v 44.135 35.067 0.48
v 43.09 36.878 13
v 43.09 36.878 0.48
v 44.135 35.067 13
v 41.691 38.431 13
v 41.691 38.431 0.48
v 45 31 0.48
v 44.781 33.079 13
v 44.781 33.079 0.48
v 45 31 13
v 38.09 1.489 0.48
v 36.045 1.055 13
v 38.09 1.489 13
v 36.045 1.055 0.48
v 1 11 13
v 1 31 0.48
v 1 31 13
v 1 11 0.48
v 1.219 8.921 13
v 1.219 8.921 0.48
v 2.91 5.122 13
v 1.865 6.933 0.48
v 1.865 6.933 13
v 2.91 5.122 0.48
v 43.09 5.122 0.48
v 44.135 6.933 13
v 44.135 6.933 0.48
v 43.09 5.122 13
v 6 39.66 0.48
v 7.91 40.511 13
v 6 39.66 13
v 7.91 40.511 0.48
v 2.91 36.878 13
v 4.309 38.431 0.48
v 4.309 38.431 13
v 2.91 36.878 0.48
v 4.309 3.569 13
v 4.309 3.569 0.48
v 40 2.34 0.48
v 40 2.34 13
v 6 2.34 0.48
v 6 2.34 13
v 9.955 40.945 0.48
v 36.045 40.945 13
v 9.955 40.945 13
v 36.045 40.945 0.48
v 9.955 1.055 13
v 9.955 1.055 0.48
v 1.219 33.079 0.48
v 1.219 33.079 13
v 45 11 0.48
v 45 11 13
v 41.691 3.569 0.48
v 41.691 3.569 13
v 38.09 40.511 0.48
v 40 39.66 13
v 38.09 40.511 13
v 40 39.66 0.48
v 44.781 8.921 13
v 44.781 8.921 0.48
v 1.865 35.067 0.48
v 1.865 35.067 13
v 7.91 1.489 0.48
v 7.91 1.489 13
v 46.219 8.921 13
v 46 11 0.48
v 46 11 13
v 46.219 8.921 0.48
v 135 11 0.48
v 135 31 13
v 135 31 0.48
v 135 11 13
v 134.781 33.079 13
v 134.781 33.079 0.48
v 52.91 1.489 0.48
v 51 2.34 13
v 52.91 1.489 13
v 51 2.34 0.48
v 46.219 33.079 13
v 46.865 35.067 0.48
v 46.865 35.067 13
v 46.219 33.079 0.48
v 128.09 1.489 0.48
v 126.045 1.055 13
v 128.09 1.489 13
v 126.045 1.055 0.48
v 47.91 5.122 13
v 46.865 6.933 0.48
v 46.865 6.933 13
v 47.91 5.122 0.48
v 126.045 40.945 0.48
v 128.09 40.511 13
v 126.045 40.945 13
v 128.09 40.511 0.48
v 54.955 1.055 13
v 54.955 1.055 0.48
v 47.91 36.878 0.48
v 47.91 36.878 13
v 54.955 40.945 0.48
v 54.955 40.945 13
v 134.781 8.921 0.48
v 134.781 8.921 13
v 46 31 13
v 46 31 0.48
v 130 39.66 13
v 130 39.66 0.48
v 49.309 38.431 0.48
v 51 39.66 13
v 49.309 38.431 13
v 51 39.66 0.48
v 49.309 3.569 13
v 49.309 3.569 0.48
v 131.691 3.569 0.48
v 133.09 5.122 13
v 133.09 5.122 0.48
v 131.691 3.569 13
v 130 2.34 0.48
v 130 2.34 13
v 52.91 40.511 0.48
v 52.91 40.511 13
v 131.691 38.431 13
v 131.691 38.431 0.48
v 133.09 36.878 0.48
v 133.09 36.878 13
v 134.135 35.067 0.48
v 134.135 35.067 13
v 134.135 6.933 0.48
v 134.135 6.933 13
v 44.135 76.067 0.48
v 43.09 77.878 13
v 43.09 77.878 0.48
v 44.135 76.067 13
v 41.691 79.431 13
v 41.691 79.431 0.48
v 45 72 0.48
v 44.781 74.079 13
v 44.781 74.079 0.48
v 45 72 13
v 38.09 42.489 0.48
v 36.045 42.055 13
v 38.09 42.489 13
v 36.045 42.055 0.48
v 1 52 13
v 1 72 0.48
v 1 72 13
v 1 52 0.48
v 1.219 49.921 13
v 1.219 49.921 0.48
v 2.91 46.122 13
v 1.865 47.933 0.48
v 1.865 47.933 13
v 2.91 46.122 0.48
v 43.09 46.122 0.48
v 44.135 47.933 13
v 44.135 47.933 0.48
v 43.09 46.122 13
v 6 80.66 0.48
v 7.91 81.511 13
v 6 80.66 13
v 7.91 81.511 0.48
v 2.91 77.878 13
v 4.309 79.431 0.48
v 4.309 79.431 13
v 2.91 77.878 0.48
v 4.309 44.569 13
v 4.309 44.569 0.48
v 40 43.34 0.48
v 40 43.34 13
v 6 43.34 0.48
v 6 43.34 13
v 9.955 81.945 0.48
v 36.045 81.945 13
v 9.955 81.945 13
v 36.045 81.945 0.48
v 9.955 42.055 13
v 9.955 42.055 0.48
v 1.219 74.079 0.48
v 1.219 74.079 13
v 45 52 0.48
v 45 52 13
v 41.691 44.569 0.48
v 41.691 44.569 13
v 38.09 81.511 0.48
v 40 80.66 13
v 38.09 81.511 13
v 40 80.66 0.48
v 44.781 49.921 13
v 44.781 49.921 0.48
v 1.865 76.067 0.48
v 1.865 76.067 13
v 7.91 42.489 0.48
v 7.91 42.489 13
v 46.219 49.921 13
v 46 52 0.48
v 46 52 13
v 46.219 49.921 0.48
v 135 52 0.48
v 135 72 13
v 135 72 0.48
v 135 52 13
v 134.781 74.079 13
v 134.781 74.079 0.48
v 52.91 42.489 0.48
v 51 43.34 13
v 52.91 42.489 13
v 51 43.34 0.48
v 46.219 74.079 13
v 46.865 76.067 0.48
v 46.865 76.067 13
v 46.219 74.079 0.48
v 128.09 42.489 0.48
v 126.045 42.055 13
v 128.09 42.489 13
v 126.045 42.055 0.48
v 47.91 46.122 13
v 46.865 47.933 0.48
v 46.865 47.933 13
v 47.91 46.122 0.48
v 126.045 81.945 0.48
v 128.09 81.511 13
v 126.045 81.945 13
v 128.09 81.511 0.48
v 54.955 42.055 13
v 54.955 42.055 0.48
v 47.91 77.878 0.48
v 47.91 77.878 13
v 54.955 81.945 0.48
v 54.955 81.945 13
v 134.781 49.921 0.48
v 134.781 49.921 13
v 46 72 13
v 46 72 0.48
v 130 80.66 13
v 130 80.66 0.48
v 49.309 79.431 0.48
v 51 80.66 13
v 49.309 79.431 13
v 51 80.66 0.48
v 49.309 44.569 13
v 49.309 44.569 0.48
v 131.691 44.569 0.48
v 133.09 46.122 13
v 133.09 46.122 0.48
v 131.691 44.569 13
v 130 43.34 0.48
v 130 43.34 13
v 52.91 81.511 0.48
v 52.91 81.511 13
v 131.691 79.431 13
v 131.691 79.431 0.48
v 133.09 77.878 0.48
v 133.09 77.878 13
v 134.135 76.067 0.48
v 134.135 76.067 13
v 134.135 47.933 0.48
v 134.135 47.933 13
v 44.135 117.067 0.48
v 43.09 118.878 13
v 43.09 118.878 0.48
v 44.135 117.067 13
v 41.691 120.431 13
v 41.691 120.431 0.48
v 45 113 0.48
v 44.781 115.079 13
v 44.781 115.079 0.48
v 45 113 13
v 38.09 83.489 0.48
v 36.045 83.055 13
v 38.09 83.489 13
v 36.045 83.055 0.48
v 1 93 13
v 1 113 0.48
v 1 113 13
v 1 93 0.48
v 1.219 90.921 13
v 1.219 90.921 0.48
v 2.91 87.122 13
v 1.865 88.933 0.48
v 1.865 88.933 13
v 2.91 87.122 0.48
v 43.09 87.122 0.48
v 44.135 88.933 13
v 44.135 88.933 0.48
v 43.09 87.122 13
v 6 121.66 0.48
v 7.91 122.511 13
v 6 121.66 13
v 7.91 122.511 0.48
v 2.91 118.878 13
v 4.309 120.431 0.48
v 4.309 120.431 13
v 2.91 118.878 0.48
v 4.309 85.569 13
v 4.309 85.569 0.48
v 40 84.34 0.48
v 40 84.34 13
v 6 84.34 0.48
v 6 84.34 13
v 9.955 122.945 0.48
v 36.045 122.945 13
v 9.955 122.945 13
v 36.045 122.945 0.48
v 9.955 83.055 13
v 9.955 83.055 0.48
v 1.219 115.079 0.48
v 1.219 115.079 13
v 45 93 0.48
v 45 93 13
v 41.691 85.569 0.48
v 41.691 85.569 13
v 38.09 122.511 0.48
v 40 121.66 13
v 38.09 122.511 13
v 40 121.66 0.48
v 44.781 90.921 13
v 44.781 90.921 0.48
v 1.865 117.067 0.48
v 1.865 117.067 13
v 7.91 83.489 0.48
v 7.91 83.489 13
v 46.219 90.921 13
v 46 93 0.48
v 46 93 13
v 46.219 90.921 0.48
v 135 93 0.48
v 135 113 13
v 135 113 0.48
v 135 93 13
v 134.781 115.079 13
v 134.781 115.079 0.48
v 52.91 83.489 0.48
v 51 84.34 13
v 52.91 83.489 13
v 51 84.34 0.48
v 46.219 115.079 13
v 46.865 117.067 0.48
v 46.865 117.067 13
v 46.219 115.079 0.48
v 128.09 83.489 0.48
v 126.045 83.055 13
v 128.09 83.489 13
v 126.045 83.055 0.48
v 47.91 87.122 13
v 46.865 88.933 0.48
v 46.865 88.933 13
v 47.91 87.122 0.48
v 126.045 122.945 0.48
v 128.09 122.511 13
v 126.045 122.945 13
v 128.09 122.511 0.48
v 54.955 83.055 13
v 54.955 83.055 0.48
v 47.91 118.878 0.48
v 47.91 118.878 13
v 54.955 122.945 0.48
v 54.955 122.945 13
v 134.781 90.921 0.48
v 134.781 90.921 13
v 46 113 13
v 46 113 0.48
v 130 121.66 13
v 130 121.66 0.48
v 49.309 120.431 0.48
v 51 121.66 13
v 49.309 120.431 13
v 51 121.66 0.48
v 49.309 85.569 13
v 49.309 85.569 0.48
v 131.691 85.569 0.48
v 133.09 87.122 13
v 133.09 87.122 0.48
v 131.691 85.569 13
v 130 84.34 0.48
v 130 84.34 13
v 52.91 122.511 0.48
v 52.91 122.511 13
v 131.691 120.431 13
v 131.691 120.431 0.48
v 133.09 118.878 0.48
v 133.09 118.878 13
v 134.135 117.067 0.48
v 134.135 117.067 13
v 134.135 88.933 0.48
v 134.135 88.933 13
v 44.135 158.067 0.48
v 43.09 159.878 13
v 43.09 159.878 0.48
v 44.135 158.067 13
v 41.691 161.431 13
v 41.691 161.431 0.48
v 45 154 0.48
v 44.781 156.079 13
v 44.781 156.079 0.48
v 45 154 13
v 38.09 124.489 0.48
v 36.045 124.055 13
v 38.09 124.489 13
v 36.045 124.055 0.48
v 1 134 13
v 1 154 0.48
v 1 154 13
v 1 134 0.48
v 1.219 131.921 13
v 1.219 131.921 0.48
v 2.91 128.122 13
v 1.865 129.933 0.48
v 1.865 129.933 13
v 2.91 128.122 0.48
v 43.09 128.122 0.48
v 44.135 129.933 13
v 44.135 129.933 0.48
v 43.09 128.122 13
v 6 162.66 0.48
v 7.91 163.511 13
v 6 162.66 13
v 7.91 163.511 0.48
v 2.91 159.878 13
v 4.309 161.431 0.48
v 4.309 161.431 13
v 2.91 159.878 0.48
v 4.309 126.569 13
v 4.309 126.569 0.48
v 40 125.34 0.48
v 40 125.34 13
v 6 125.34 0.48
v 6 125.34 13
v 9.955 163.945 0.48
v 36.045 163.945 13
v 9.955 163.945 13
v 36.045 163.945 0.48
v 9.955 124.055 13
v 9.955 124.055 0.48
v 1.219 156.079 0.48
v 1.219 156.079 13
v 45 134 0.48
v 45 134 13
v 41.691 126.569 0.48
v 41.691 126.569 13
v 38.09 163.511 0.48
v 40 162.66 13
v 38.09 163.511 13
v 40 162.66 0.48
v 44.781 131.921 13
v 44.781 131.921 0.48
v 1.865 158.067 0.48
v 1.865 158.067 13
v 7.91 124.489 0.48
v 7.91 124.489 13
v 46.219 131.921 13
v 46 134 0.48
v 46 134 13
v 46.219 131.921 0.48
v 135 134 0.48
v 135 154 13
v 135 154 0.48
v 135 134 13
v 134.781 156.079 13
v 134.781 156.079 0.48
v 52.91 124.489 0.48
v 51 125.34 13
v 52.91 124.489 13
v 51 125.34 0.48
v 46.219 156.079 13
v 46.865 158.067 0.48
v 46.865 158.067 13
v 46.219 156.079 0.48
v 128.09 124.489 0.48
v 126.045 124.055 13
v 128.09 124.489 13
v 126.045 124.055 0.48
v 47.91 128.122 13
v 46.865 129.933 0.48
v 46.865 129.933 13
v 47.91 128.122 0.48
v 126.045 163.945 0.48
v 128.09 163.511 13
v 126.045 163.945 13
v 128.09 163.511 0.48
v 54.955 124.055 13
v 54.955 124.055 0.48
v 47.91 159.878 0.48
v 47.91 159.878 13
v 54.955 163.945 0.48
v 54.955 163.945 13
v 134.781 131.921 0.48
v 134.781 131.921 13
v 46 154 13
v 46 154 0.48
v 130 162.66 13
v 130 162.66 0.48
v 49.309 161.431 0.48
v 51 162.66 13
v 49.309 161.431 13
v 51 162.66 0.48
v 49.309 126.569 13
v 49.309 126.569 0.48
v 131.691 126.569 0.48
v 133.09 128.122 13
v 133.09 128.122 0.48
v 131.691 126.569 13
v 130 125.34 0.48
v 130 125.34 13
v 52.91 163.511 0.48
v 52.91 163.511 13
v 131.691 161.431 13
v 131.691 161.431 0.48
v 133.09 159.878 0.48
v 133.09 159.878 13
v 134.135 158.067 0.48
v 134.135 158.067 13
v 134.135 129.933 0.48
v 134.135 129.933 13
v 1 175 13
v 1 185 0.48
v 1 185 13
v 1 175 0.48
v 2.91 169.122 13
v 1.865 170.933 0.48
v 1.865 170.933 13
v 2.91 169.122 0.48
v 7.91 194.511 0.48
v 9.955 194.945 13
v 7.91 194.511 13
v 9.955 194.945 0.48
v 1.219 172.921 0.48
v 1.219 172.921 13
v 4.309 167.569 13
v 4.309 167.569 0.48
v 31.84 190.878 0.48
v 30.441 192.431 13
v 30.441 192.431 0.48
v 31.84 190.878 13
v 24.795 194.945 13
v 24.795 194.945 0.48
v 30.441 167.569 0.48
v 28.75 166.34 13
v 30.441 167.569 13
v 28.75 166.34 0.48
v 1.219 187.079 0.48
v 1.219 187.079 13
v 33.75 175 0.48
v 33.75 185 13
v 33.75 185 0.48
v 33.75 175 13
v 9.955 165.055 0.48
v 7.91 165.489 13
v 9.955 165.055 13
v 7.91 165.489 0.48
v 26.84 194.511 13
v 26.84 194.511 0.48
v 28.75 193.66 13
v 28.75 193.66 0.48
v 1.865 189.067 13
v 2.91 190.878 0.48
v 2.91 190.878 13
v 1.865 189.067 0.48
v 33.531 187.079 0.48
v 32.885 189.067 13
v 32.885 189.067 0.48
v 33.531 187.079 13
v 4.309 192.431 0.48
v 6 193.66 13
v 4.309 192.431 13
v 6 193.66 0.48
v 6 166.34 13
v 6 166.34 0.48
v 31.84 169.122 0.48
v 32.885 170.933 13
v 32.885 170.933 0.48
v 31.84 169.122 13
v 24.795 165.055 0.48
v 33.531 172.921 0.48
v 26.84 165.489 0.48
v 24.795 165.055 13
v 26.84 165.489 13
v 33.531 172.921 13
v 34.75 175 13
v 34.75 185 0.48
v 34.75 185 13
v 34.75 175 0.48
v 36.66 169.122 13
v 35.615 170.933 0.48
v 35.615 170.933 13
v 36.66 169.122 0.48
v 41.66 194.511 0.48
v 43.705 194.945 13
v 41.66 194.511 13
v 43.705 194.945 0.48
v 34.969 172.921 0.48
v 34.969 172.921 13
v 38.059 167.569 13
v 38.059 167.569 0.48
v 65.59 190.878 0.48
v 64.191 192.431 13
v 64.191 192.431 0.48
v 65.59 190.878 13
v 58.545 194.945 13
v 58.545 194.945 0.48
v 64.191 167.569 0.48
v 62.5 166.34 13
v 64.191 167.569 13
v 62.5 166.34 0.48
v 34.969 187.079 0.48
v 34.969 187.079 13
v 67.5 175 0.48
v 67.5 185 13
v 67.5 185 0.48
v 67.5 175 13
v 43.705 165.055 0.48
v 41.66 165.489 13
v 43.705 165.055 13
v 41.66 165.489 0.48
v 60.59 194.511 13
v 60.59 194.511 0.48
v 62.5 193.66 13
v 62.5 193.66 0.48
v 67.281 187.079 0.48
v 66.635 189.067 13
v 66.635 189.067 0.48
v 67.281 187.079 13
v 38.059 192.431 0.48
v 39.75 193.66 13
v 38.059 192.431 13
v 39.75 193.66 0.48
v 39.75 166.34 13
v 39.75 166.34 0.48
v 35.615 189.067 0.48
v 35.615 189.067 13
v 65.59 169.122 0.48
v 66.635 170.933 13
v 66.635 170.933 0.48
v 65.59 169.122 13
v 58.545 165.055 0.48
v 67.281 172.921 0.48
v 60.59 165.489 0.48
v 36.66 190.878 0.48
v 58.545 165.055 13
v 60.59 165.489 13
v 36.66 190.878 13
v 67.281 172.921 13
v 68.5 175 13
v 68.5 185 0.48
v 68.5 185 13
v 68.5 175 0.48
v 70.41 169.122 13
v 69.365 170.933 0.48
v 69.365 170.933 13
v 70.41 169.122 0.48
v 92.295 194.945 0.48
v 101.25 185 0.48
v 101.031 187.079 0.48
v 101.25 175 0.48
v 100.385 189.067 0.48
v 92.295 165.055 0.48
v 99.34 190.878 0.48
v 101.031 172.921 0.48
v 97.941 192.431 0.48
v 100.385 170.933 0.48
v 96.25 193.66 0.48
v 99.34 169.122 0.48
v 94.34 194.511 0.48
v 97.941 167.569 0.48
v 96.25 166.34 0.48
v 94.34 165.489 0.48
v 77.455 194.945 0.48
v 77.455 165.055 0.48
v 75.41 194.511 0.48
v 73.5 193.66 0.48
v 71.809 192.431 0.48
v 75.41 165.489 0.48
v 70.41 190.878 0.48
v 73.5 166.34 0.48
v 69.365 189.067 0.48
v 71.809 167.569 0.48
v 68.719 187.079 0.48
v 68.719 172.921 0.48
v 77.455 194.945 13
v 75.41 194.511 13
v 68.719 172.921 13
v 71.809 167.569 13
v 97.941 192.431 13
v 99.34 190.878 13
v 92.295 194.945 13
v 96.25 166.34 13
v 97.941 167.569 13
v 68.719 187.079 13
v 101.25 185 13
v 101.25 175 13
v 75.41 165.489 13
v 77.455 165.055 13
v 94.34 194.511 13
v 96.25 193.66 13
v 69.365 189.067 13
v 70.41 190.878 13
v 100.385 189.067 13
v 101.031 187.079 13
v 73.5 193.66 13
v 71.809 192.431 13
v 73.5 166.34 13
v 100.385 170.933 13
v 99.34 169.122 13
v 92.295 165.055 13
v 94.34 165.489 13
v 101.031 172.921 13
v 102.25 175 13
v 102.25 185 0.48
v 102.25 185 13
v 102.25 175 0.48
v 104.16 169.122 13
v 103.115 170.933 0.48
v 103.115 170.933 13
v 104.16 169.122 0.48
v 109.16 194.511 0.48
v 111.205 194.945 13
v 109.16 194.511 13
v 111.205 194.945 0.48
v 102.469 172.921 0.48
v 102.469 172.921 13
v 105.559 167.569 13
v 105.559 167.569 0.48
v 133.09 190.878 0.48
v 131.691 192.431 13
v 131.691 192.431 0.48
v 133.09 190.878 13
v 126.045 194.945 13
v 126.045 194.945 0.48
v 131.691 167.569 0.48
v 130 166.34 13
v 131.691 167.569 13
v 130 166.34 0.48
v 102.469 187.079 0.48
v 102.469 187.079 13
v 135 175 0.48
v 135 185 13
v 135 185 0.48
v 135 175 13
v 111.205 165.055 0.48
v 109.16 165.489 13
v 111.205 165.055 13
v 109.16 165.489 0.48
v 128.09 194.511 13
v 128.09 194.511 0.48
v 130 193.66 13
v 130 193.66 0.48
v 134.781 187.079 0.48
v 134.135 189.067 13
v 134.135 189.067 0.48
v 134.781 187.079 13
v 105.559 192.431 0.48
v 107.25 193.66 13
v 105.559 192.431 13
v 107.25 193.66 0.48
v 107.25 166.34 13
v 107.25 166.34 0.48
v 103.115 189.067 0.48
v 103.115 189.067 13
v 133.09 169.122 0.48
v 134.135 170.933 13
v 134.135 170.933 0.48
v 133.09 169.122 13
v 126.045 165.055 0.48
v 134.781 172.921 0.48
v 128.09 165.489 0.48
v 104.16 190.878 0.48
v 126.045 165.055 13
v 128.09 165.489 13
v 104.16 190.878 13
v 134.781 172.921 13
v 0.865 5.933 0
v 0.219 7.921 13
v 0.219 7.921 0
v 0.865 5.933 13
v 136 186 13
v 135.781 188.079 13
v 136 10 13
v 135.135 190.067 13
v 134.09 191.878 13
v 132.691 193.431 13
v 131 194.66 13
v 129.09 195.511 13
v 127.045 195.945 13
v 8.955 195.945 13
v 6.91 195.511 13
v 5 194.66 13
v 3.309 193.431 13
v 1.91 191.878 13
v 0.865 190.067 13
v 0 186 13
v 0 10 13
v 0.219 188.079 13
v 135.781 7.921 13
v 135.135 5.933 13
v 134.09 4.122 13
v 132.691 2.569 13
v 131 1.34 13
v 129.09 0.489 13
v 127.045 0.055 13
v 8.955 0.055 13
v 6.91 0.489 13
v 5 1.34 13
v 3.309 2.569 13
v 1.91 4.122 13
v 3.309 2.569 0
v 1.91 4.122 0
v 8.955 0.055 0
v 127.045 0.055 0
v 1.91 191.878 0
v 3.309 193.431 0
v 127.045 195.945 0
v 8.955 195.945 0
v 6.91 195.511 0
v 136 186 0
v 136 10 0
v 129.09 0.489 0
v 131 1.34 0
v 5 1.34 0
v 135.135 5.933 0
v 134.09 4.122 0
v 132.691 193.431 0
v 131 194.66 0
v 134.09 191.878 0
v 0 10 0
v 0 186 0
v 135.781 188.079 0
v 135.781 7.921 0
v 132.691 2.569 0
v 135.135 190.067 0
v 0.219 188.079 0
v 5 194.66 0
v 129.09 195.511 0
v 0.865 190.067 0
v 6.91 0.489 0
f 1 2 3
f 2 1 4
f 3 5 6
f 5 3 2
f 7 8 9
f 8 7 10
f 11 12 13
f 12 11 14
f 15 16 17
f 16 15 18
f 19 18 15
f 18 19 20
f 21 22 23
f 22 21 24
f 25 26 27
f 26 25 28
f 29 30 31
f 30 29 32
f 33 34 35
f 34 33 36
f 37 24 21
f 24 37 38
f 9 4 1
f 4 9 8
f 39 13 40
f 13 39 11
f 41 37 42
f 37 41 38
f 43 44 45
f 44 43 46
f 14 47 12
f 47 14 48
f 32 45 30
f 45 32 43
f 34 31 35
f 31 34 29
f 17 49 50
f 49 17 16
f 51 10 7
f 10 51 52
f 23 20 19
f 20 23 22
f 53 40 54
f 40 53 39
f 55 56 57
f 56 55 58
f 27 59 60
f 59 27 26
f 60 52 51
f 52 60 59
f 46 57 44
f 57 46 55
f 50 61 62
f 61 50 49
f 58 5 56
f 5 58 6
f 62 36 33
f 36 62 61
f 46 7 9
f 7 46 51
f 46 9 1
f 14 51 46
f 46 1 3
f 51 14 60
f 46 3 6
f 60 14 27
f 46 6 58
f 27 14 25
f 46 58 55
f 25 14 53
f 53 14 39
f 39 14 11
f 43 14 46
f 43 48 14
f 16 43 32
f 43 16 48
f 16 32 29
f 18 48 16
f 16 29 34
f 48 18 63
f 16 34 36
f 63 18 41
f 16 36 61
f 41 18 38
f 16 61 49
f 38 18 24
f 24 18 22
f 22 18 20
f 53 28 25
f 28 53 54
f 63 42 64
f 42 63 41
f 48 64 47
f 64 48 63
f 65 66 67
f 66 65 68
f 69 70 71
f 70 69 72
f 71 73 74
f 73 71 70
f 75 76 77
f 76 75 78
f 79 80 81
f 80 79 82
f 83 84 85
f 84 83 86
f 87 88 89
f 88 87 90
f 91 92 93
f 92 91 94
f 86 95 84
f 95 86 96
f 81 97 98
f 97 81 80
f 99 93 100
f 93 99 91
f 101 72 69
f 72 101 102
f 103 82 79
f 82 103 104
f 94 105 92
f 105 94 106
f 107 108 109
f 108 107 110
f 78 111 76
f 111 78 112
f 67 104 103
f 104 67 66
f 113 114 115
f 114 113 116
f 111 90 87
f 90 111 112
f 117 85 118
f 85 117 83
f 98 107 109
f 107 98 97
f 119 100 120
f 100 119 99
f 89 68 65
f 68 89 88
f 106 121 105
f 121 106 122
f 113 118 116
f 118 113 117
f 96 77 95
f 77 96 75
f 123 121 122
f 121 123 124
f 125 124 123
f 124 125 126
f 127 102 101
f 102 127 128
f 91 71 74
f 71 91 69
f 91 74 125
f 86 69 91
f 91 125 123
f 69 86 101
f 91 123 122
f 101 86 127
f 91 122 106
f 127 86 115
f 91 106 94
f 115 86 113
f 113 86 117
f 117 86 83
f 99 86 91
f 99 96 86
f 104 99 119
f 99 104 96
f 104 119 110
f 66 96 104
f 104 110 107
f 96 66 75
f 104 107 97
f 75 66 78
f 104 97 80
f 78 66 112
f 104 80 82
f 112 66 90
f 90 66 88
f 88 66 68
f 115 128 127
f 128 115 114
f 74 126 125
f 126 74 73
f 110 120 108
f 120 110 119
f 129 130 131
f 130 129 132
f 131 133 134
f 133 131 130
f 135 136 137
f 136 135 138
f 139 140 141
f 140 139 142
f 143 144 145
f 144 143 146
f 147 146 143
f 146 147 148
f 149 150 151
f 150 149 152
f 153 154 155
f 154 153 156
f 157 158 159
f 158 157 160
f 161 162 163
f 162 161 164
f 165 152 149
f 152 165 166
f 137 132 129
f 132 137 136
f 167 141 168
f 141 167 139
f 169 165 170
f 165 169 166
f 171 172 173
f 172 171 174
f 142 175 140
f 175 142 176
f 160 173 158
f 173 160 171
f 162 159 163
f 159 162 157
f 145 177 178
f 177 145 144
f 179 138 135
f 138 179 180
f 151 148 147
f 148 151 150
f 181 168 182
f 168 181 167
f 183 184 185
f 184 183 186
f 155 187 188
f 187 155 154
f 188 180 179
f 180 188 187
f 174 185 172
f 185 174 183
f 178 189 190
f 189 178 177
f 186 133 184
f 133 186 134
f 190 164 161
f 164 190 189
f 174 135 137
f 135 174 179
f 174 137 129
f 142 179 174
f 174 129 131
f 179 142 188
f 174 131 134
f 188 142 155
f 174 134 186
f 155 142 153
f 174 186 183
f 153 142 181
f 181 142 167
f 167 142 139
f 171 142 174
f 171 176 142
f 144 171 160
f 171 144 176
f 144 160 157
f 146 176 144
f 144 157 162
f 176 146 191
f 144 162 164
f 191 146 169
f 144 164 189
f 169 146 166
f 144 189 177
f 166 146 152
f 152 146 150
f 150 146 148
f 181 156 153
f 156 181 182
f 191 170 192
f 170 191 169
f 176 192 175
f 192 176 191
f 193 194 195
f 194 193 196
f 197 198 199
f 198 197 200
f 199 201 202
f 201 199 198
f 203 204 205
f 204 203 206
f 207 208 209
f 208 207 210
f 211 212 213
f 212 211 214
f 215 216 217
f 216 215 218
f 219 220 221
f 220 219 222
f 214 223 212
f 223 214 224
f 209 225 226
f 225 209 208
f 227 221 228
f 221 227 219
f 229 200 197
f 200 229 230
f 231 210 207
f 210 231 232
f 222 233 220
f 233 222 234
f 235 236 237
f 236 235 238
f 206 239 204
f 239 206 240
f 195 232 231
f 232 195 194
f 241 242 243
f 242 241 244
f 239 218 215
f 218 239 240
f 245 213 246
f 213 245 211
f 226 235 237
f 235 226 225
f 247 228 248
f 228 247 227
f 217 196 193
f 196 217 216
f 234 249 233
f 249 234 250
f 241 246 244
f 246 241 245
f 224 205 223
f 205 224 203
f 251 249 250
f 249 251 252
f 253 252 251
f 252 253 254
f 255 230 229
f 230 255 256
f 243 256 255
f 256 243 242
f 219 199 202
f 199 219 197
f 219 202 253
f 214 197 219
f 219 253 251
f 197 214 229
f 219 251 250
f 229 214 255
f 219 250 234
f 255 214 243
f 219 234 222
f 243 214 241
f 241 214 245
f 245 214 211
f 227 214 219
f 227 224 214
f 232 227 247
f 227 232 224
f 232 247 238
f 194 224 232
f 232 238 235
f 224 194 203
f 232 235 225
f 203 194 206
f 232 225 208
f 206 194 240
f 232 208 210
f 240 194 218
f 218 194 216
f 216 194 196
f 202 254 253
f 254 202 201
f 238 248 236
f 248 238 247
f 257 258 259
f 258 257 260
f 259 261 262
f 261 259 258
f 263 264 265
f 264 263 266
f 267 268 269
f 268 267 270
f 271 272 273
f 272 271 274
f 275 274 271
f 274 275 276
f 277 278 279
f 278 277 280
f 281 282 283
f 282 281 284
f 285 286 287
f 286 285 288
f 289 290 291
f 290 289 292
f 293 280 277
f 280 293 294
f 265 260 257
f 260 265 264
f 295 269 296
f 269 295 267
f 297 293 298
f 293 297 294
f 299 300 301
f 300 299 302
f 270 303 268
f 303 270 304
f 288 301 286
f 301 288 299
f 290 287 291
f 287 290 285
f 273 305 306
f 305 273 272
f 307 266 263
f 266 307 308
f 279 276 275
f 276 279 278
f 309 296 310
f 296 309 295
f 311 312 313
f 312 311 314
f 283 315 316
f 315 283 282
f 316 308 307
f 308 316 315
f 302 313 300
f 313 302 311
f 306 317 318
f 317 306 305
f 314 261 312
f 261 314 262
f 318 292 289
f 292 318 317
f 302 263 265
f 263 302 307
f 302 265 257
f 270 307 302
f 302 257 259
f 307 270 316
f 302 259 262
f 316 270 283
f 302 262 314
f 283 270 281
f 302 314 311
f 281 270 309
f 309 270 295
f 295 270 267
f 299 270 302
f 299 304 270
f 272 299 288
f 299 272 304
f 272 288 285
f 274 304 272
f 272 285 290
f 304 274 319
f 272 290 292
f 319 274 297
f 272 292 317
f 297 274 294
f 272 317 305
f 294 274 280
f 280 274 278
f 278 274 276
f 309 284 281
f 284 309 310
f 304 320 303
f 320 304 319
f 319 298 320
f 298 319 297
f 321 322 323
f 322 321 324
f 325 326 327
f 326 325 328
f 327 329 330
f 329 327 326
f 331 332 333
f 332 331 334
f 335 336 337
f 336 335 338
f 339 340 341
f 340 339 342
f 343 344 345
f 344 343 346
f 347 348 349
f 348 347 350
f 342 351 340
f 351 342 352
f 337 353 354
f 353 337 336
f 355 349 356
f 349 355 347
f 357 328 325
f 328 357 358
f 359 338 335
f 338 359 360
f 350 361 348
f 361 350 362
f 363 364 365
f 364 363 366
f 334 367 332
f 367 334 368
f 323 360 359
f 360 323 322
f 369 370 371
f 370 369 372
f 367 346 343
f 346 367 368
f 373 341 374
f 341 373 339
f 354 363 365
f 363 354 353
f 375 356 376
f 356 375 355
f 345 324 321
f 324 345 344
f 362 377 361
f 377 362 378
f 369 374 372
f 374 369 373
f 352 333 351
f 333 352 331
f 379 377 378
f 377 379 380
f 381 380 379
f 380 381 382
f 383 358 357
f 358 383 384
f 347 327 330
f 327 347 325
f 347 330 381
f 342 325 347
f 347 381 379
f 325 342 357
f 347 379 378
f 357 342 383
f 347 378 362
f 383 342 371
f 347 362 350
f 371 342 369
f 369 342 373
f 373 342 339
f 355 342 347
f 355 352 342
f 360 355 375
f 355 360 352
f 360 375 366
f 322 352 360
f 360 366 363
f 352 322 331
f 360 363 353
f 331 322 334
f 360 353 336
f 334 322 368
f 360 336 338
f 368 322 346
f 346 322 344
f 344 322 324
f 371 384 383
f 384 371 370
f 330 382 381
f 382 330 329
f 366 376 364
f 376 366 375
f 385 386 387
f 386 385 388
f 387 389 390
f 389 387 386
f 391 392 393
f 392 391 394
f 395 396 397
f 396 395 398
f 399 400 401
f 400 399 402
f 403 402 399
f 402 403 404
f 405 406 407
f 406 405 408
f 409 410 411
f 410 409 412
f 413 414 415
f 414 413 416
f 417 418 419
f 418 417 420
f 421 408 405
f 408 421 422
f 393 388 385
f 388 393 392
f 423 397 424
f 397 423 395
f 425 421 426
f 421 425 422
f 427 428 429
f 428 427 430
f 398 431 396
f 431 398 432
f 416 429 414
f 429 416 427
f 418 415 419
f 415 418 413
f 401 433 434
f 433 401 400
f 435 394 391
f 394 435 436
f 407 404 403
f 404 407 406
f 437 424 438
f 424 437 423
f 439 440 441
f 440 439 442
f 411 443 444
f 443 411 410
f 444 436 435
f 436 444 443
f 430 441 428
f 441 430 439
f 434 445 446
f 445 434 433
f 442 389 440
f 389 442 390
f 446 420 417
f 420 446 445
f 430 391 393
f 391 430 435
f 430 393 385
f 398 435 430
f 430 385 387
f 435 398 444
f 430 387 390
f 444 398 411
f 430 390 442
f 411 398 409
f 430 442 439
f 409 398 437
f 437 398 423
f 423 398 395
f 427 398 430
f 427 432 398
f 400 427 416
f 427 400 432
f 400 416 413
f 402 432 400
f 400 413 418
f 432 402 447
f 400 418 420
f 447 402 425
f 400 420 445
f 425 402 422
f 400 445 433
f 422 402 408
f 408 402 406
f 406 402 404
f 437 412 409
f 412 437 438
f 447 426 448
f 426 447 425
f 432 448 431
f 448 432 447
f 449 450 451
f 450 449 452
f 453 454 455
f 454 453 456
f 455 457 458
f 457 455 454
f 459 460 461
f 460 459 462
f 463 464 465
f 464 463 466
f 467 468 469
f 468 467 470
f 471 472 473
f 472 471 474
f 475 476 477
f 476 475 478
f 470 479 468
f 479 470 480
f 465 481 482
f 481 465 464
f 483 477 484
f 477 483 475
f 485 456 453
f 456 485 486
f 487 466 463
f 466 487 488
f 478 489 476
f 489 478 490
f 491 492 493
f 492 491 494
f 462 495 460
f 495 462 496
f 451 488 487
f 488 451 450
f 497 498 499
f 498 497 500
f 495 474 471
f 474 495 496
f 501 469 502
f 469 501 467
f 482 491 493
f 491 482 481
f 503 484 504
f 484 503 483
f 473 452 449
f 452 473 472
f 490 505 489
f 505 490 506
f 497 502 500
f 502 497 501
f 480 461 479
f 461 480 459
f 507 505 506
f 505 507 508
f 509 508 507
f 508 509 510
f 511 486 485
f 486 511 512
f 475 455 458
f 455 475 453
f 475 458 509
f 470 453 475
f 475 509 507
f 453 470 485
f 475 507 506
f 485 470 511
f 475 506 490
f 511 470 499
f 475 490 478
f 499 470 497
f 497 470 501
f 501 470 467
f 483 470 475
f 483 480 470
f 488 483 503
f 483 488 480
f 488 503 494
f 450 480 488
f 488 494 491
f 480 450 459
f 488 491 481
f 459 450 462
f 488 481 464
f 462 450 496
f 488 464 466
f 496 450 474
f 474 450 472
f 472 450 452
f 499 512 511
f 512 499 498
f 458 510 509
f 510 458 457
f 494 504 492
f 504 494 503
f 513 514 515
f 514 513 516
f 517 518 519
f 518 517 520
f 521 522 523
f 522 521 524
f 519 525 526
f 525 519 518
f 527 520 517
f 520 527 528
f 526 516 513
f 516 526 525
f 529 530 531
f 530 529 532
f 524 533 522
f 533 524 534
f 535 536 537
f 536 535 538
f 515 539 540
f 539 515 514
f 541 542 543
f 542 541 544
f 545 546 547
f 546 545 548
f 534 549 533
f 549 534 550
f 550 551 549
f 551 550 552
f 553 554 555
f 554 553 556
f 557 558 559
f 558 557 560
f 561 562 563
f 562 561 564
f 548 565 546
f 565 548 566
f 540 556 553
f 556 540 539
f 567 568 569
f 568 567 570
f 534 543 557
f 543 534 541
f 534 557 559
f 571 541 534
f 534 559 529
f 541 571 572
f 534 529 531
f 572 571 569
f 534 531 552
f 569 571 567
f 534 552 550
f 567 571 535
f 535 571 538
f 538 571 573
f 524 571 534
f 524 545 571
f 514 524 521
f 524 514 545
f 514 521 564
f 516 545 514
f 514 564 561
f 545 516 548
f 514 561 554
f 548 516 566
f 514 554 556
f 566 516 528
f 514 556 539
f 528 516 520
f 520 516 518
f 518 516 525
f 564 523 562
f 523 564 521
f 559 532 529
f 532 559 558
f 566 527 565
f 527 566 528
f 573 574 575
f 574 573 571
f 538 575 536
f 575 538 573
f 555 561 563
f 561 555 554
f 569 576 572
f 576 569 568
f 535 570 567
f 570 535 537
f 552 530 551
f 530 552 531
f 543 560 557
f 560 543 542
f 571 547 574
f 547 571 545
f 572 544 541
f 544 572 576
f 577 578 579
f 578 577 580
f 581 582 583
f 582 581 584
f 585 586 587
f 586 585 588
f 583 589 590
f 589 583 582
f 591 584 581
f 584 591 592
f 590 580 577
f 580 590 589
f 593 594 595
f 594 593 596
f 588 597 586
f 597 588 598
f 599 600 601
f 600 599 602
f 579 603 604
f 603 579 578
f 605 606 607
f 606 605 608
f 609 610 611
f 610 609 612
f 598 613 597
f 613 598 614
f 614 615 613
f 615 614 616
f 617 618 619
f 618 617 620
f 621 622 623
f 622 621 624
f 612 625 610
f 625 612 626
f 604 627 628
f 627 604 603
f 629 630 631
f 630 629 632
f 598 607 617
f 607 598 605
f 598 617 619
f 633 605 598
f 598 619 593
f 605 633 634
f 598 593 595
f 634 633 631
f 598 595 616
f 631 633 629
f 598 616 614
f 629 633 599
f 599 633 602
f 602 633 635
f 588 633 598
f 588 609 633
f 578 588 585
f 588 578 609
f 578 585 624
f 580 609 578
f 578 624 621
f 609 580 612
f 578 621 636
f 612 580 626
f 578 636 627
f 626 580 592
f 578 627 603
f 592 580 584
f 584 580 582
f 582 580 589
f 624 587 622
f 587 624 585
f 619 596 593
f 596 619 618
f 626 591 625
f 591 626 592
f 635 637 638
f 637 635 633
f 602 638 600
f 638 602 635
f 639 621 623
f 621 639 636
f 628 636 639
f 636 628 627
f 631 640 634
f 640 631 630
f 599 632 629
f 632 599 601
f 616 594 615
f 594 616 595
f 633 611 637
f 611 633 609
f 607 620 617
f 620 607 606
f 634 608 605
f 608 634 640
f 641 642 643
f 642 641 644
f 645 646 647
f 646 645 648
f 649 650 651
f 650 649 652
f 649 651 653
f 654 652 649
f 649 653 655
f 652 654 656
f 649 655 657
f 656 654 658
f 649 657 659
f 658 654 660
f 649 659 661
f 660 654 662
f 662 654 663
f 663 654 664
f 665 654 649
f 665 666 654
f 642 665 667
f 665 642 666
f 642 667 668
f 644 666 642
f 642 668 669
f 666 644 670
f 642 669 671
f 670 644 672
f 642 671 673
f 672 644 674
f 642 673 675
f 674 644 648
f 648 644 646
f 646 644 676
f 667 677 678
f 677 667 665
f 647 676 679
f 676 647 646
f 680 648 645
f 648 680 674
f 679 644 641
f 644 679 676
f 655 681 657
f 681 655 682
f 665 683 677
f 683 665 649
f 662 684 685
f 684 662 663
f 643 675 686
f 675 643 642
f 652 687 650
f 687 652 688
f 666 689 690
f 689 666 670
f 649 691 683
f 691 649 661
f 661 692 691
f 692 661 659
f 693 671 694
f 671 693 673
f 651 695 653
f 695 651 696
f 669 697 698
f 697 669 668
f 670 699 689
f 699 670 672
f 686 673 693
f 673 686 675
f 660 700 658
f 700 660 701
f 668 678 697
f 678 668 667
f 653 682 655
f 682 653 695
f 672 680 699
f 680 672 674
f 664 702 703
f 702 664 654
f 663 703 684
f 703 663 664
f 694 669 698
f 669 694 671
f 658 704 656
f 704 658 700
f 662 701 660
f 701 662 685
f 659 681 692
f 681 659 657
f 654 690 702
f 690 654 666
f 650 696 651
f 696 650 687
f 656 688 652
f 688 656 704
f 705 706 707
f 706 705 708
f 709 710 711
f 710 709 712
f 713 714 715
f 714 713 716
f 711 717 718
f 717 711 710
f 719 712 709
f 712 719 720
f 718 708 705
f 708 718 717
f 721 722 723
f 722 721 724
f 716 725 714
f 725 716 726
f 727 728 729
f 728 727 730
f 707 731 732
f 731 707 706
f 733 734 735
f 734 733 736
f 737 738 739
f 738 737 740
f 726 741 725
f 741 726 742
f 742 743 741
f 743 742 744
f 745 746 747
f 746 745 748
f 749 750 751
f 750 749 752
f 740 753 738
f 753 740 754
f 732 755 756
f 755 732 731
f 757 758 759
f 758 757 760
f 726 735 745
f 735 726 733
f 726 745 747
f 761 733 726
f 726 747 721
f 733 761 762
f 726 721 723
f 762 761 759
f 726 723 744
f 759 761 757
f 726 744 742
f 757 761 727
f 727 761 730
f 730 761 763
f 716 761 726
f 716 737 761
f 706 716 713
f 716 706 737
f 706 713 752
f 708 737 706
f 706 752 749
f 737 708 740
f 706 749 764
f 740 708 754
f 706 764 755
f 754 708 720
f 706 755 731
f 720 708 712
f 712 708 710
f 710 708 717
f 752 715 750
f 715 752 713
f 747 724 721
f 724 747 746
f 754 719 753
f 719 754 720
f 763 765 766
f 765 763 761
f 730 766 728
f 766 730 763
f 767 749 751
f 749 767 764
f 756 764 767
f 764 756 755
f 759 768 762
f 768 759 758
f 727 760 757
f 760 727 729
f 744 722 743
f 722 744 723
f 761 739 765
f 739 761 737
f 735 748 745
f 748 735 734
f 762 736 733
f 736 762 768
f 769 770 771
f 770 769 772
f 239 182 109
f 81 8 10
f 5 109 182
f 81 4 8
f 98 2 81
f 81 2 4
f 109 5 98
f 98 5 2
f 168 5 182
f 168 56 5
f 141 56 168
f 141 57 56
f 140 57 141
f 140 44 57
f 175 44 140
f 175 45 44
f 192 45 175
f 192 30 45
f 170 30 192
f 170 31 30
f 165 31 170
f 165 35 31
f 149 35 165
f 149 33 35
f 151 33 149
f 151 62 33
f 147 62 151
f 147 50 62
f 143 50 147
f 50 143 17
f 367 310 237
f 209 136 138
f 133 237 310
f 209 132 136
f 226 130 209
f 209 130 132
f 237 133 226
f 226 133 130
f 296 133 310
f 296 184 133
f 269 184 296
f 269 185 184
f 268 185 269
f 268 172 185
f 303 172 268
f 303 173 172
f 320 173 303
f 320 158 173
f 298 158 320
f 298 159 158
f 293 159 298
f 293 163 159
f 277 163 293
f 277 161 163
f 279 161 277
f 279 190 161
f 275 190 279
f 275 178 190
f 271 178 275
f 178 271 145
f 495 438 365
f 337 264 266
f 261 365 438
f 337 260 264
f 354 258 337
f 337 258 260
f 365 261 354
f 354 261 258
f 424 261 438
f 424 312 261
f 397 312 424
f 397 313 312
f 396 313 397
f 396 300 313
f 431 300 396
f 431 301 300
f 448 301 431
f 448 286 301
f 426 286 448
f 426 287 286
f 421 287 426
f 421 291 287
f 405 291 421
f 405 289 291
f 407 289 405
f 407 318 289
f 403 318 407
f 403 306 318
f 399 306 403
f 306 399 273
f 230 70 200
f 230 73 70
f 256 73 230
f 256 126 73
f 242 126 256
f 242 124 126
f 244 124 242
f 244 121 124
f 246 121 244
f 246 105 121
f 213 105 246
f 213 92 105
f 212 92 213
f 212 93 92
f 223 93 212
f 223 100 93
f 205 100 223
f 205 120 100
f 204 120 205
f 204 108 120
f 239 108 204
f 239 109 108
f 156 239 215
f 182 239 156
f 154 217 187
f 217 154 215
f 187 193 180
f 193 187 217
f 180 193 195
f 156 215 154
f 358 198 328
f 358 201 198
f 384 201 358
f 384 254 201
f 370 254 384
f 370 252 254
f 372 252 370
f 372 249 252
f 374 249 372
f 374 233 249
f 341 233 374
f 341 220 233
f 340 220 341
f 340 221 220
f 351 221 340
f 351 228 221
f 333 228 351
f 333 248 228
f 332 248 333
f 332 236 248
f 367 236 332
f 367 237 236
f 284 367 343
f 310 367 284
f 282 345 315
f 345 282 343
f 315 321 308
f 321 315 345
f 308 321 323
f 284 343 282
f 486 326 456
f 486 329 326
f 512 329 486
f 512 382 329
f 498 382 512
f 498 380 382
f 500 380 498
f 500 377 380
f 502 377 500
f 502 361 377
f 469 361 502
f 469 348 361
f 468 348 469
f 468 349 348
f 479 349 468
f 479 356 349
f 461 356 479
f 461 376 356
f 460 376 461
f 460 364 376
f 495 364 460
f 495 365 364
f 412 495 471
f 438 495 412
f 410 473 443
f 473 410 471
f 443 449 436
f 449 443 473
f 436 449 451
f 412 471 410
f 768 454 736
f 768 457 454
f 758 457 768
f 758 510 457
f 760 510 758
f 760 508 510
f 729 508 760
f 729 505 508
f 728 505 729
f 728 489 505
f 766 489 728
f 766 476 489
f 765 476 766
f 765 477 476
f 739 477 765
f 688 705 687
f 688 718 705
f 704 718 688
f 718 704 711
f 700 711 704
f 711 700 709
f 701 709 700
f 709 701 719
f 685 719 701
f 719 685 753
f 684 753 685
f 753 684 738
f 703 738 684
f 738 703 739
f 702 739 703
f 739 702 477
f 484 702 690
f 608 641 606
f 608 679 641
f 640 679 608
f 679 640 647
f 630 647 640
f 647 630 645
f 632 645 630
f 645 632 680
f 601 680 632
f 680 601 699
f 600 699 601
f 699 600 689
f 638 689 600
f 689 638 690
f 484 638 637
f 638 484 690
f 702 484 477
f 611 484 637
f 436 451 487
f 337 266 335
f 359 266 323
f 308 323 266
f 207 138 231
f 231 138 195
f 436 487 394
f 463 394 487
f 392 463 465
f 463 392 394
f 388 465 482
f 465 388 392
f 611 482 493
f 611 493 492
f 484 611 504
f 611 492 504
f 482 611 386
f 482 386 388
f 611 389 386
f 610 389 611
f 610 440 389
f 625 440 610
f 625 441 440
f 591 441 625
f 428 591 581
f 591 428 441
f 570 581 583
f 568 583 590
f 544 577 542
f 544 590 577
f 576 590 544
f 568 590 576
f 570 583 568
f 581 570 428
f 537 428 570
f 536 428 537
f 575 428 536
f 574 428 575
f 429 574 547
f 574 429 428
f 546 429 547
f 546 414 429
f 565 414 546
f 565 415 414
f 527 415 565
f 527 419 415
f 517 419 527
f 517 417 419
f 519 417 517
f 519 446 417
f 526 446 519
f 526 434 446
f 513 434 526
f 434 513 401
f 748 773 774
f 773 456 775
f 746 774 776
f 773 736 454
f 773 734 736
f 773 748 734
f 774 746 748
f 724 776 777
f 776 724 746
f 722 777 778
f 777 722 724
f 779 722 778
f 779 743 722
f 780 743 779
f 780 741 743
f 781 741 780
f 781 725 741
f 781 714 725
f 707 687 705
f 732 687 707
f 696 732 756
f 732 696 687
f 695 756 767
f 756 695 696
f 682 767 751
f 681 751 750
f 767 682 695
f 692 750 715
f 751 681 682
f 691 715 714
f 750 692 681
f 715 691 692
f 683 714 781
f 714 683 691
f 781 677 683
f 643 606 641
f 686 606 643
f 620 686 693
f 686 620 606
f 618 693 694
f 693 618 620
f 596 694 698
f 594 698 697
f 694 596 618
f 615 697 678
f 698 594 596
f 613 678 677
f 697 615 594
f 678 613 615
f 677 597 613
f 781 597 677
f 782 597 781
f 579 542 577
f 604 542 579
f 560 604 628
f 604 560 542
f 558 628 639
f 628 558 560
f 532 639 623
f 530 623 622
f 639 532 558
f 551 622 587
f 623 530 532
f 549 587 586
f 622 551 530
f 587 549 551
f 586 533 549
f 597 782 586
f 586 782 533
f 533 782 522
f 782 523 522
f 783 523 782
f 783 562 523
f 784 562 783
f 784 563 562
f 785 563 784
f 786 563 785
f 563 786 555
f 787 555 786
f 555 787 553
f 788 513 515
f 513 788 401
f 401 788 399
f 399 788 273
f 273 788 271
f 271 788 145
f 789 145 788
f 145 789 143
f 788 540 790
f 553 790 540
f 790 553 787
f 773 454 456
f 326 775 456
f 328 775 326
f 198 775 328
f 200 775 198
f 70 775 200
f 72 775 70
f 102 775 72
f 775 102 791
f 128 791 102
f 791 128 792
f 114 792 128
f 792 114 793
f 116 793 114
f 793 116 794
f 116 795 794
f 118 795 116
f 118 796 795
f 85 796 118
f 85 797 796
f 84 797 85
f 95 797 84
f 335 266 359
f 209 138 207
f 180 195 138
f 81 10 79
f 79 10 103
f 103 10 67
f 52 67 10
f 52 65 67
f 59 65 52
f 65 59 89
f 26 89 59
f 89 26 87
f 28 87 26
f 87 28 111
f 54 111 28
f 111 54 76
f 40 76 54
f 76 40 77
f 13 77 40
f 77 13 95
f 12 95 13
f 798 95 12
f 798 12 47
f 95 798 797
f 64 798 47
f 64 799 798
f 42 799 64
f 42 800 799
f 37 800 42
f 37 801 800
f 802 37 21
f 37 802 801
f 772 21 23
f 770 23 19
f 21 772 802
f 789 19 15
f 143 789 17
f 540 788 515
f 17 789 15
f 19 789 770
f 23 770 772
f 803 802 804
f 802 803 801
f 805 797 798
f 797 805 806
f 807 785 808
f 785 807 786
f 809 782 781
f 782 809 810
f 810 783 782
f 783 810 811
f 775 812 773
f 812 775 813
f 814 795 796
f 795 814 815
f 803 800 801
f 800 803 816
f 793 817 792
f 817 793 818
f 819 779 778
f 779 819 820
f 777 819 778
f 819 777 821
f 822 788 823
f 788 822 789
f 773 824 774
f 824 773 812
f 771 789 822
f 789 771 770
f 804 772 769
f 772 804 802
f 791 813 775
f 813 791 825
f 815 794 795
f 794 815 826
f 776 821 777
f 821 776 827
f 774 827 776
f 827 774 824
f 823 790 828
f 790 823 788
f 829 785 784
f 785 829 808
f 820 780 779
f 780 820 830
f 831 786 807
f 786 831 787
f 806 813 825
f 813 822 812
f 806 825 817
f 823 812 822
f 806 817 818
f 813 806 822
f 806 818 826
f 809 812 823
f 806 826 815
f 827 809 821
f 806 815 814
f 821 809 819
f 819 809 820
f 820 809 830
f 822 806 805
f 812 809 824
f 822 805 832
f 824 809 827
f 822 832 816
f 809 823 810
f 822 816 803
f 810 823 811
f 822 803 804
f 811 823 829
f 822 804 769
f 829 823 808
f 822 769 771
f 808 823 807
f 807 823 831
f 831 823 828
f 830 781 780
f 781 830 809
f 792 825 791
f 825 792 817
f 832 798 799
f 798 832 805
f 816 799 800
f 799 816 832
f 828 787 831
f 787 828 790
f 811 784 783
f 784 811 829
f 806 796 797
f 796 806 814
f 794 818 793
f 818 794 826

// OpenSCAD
module roundedCube(vec,rad) {
    hull() {
        translate([rad,rad,0]) cylinder(r=rad,h=vec.z);
        translate([vec.x-rad,rad,0]) cylinder(r=rad,h=vec.z);
        translate([rad,vec.y-rad,0]) cylinder(r=rad,h=vec.z);
        translate([vec.x-rad,vec.y-rad,0]) cylinder(r=rad,h=vec.z);
    }
}

module topTray() {
    w = 136;
    h = 196;
    cy = 40;
    th = 0.20 + 0.28;
    r = 10;
    n1 = 3;
    cx1 = (w - (n1+1)) / n1;
    n2 = 4;
    cx2 = (w - (n2+1)) / n2;
    difference() {
        roundedCube([136,196,13],r);
        for (i=[0:3]) {
            translate([1,(cy+1)*i+1,th]) {
                roundedCube([cx1,cy,99],r);
                translate([cx1+1,0,0]) roundedCube([w-cx1-3,cy,99],r);
            }
        }
        translate([0,165,th]) for (i=[0:n2-1]) translate([1+(cx2+1)*i,0,0]) roundedCube([cx2,30,99],r);
    }
    
}

topTray();
